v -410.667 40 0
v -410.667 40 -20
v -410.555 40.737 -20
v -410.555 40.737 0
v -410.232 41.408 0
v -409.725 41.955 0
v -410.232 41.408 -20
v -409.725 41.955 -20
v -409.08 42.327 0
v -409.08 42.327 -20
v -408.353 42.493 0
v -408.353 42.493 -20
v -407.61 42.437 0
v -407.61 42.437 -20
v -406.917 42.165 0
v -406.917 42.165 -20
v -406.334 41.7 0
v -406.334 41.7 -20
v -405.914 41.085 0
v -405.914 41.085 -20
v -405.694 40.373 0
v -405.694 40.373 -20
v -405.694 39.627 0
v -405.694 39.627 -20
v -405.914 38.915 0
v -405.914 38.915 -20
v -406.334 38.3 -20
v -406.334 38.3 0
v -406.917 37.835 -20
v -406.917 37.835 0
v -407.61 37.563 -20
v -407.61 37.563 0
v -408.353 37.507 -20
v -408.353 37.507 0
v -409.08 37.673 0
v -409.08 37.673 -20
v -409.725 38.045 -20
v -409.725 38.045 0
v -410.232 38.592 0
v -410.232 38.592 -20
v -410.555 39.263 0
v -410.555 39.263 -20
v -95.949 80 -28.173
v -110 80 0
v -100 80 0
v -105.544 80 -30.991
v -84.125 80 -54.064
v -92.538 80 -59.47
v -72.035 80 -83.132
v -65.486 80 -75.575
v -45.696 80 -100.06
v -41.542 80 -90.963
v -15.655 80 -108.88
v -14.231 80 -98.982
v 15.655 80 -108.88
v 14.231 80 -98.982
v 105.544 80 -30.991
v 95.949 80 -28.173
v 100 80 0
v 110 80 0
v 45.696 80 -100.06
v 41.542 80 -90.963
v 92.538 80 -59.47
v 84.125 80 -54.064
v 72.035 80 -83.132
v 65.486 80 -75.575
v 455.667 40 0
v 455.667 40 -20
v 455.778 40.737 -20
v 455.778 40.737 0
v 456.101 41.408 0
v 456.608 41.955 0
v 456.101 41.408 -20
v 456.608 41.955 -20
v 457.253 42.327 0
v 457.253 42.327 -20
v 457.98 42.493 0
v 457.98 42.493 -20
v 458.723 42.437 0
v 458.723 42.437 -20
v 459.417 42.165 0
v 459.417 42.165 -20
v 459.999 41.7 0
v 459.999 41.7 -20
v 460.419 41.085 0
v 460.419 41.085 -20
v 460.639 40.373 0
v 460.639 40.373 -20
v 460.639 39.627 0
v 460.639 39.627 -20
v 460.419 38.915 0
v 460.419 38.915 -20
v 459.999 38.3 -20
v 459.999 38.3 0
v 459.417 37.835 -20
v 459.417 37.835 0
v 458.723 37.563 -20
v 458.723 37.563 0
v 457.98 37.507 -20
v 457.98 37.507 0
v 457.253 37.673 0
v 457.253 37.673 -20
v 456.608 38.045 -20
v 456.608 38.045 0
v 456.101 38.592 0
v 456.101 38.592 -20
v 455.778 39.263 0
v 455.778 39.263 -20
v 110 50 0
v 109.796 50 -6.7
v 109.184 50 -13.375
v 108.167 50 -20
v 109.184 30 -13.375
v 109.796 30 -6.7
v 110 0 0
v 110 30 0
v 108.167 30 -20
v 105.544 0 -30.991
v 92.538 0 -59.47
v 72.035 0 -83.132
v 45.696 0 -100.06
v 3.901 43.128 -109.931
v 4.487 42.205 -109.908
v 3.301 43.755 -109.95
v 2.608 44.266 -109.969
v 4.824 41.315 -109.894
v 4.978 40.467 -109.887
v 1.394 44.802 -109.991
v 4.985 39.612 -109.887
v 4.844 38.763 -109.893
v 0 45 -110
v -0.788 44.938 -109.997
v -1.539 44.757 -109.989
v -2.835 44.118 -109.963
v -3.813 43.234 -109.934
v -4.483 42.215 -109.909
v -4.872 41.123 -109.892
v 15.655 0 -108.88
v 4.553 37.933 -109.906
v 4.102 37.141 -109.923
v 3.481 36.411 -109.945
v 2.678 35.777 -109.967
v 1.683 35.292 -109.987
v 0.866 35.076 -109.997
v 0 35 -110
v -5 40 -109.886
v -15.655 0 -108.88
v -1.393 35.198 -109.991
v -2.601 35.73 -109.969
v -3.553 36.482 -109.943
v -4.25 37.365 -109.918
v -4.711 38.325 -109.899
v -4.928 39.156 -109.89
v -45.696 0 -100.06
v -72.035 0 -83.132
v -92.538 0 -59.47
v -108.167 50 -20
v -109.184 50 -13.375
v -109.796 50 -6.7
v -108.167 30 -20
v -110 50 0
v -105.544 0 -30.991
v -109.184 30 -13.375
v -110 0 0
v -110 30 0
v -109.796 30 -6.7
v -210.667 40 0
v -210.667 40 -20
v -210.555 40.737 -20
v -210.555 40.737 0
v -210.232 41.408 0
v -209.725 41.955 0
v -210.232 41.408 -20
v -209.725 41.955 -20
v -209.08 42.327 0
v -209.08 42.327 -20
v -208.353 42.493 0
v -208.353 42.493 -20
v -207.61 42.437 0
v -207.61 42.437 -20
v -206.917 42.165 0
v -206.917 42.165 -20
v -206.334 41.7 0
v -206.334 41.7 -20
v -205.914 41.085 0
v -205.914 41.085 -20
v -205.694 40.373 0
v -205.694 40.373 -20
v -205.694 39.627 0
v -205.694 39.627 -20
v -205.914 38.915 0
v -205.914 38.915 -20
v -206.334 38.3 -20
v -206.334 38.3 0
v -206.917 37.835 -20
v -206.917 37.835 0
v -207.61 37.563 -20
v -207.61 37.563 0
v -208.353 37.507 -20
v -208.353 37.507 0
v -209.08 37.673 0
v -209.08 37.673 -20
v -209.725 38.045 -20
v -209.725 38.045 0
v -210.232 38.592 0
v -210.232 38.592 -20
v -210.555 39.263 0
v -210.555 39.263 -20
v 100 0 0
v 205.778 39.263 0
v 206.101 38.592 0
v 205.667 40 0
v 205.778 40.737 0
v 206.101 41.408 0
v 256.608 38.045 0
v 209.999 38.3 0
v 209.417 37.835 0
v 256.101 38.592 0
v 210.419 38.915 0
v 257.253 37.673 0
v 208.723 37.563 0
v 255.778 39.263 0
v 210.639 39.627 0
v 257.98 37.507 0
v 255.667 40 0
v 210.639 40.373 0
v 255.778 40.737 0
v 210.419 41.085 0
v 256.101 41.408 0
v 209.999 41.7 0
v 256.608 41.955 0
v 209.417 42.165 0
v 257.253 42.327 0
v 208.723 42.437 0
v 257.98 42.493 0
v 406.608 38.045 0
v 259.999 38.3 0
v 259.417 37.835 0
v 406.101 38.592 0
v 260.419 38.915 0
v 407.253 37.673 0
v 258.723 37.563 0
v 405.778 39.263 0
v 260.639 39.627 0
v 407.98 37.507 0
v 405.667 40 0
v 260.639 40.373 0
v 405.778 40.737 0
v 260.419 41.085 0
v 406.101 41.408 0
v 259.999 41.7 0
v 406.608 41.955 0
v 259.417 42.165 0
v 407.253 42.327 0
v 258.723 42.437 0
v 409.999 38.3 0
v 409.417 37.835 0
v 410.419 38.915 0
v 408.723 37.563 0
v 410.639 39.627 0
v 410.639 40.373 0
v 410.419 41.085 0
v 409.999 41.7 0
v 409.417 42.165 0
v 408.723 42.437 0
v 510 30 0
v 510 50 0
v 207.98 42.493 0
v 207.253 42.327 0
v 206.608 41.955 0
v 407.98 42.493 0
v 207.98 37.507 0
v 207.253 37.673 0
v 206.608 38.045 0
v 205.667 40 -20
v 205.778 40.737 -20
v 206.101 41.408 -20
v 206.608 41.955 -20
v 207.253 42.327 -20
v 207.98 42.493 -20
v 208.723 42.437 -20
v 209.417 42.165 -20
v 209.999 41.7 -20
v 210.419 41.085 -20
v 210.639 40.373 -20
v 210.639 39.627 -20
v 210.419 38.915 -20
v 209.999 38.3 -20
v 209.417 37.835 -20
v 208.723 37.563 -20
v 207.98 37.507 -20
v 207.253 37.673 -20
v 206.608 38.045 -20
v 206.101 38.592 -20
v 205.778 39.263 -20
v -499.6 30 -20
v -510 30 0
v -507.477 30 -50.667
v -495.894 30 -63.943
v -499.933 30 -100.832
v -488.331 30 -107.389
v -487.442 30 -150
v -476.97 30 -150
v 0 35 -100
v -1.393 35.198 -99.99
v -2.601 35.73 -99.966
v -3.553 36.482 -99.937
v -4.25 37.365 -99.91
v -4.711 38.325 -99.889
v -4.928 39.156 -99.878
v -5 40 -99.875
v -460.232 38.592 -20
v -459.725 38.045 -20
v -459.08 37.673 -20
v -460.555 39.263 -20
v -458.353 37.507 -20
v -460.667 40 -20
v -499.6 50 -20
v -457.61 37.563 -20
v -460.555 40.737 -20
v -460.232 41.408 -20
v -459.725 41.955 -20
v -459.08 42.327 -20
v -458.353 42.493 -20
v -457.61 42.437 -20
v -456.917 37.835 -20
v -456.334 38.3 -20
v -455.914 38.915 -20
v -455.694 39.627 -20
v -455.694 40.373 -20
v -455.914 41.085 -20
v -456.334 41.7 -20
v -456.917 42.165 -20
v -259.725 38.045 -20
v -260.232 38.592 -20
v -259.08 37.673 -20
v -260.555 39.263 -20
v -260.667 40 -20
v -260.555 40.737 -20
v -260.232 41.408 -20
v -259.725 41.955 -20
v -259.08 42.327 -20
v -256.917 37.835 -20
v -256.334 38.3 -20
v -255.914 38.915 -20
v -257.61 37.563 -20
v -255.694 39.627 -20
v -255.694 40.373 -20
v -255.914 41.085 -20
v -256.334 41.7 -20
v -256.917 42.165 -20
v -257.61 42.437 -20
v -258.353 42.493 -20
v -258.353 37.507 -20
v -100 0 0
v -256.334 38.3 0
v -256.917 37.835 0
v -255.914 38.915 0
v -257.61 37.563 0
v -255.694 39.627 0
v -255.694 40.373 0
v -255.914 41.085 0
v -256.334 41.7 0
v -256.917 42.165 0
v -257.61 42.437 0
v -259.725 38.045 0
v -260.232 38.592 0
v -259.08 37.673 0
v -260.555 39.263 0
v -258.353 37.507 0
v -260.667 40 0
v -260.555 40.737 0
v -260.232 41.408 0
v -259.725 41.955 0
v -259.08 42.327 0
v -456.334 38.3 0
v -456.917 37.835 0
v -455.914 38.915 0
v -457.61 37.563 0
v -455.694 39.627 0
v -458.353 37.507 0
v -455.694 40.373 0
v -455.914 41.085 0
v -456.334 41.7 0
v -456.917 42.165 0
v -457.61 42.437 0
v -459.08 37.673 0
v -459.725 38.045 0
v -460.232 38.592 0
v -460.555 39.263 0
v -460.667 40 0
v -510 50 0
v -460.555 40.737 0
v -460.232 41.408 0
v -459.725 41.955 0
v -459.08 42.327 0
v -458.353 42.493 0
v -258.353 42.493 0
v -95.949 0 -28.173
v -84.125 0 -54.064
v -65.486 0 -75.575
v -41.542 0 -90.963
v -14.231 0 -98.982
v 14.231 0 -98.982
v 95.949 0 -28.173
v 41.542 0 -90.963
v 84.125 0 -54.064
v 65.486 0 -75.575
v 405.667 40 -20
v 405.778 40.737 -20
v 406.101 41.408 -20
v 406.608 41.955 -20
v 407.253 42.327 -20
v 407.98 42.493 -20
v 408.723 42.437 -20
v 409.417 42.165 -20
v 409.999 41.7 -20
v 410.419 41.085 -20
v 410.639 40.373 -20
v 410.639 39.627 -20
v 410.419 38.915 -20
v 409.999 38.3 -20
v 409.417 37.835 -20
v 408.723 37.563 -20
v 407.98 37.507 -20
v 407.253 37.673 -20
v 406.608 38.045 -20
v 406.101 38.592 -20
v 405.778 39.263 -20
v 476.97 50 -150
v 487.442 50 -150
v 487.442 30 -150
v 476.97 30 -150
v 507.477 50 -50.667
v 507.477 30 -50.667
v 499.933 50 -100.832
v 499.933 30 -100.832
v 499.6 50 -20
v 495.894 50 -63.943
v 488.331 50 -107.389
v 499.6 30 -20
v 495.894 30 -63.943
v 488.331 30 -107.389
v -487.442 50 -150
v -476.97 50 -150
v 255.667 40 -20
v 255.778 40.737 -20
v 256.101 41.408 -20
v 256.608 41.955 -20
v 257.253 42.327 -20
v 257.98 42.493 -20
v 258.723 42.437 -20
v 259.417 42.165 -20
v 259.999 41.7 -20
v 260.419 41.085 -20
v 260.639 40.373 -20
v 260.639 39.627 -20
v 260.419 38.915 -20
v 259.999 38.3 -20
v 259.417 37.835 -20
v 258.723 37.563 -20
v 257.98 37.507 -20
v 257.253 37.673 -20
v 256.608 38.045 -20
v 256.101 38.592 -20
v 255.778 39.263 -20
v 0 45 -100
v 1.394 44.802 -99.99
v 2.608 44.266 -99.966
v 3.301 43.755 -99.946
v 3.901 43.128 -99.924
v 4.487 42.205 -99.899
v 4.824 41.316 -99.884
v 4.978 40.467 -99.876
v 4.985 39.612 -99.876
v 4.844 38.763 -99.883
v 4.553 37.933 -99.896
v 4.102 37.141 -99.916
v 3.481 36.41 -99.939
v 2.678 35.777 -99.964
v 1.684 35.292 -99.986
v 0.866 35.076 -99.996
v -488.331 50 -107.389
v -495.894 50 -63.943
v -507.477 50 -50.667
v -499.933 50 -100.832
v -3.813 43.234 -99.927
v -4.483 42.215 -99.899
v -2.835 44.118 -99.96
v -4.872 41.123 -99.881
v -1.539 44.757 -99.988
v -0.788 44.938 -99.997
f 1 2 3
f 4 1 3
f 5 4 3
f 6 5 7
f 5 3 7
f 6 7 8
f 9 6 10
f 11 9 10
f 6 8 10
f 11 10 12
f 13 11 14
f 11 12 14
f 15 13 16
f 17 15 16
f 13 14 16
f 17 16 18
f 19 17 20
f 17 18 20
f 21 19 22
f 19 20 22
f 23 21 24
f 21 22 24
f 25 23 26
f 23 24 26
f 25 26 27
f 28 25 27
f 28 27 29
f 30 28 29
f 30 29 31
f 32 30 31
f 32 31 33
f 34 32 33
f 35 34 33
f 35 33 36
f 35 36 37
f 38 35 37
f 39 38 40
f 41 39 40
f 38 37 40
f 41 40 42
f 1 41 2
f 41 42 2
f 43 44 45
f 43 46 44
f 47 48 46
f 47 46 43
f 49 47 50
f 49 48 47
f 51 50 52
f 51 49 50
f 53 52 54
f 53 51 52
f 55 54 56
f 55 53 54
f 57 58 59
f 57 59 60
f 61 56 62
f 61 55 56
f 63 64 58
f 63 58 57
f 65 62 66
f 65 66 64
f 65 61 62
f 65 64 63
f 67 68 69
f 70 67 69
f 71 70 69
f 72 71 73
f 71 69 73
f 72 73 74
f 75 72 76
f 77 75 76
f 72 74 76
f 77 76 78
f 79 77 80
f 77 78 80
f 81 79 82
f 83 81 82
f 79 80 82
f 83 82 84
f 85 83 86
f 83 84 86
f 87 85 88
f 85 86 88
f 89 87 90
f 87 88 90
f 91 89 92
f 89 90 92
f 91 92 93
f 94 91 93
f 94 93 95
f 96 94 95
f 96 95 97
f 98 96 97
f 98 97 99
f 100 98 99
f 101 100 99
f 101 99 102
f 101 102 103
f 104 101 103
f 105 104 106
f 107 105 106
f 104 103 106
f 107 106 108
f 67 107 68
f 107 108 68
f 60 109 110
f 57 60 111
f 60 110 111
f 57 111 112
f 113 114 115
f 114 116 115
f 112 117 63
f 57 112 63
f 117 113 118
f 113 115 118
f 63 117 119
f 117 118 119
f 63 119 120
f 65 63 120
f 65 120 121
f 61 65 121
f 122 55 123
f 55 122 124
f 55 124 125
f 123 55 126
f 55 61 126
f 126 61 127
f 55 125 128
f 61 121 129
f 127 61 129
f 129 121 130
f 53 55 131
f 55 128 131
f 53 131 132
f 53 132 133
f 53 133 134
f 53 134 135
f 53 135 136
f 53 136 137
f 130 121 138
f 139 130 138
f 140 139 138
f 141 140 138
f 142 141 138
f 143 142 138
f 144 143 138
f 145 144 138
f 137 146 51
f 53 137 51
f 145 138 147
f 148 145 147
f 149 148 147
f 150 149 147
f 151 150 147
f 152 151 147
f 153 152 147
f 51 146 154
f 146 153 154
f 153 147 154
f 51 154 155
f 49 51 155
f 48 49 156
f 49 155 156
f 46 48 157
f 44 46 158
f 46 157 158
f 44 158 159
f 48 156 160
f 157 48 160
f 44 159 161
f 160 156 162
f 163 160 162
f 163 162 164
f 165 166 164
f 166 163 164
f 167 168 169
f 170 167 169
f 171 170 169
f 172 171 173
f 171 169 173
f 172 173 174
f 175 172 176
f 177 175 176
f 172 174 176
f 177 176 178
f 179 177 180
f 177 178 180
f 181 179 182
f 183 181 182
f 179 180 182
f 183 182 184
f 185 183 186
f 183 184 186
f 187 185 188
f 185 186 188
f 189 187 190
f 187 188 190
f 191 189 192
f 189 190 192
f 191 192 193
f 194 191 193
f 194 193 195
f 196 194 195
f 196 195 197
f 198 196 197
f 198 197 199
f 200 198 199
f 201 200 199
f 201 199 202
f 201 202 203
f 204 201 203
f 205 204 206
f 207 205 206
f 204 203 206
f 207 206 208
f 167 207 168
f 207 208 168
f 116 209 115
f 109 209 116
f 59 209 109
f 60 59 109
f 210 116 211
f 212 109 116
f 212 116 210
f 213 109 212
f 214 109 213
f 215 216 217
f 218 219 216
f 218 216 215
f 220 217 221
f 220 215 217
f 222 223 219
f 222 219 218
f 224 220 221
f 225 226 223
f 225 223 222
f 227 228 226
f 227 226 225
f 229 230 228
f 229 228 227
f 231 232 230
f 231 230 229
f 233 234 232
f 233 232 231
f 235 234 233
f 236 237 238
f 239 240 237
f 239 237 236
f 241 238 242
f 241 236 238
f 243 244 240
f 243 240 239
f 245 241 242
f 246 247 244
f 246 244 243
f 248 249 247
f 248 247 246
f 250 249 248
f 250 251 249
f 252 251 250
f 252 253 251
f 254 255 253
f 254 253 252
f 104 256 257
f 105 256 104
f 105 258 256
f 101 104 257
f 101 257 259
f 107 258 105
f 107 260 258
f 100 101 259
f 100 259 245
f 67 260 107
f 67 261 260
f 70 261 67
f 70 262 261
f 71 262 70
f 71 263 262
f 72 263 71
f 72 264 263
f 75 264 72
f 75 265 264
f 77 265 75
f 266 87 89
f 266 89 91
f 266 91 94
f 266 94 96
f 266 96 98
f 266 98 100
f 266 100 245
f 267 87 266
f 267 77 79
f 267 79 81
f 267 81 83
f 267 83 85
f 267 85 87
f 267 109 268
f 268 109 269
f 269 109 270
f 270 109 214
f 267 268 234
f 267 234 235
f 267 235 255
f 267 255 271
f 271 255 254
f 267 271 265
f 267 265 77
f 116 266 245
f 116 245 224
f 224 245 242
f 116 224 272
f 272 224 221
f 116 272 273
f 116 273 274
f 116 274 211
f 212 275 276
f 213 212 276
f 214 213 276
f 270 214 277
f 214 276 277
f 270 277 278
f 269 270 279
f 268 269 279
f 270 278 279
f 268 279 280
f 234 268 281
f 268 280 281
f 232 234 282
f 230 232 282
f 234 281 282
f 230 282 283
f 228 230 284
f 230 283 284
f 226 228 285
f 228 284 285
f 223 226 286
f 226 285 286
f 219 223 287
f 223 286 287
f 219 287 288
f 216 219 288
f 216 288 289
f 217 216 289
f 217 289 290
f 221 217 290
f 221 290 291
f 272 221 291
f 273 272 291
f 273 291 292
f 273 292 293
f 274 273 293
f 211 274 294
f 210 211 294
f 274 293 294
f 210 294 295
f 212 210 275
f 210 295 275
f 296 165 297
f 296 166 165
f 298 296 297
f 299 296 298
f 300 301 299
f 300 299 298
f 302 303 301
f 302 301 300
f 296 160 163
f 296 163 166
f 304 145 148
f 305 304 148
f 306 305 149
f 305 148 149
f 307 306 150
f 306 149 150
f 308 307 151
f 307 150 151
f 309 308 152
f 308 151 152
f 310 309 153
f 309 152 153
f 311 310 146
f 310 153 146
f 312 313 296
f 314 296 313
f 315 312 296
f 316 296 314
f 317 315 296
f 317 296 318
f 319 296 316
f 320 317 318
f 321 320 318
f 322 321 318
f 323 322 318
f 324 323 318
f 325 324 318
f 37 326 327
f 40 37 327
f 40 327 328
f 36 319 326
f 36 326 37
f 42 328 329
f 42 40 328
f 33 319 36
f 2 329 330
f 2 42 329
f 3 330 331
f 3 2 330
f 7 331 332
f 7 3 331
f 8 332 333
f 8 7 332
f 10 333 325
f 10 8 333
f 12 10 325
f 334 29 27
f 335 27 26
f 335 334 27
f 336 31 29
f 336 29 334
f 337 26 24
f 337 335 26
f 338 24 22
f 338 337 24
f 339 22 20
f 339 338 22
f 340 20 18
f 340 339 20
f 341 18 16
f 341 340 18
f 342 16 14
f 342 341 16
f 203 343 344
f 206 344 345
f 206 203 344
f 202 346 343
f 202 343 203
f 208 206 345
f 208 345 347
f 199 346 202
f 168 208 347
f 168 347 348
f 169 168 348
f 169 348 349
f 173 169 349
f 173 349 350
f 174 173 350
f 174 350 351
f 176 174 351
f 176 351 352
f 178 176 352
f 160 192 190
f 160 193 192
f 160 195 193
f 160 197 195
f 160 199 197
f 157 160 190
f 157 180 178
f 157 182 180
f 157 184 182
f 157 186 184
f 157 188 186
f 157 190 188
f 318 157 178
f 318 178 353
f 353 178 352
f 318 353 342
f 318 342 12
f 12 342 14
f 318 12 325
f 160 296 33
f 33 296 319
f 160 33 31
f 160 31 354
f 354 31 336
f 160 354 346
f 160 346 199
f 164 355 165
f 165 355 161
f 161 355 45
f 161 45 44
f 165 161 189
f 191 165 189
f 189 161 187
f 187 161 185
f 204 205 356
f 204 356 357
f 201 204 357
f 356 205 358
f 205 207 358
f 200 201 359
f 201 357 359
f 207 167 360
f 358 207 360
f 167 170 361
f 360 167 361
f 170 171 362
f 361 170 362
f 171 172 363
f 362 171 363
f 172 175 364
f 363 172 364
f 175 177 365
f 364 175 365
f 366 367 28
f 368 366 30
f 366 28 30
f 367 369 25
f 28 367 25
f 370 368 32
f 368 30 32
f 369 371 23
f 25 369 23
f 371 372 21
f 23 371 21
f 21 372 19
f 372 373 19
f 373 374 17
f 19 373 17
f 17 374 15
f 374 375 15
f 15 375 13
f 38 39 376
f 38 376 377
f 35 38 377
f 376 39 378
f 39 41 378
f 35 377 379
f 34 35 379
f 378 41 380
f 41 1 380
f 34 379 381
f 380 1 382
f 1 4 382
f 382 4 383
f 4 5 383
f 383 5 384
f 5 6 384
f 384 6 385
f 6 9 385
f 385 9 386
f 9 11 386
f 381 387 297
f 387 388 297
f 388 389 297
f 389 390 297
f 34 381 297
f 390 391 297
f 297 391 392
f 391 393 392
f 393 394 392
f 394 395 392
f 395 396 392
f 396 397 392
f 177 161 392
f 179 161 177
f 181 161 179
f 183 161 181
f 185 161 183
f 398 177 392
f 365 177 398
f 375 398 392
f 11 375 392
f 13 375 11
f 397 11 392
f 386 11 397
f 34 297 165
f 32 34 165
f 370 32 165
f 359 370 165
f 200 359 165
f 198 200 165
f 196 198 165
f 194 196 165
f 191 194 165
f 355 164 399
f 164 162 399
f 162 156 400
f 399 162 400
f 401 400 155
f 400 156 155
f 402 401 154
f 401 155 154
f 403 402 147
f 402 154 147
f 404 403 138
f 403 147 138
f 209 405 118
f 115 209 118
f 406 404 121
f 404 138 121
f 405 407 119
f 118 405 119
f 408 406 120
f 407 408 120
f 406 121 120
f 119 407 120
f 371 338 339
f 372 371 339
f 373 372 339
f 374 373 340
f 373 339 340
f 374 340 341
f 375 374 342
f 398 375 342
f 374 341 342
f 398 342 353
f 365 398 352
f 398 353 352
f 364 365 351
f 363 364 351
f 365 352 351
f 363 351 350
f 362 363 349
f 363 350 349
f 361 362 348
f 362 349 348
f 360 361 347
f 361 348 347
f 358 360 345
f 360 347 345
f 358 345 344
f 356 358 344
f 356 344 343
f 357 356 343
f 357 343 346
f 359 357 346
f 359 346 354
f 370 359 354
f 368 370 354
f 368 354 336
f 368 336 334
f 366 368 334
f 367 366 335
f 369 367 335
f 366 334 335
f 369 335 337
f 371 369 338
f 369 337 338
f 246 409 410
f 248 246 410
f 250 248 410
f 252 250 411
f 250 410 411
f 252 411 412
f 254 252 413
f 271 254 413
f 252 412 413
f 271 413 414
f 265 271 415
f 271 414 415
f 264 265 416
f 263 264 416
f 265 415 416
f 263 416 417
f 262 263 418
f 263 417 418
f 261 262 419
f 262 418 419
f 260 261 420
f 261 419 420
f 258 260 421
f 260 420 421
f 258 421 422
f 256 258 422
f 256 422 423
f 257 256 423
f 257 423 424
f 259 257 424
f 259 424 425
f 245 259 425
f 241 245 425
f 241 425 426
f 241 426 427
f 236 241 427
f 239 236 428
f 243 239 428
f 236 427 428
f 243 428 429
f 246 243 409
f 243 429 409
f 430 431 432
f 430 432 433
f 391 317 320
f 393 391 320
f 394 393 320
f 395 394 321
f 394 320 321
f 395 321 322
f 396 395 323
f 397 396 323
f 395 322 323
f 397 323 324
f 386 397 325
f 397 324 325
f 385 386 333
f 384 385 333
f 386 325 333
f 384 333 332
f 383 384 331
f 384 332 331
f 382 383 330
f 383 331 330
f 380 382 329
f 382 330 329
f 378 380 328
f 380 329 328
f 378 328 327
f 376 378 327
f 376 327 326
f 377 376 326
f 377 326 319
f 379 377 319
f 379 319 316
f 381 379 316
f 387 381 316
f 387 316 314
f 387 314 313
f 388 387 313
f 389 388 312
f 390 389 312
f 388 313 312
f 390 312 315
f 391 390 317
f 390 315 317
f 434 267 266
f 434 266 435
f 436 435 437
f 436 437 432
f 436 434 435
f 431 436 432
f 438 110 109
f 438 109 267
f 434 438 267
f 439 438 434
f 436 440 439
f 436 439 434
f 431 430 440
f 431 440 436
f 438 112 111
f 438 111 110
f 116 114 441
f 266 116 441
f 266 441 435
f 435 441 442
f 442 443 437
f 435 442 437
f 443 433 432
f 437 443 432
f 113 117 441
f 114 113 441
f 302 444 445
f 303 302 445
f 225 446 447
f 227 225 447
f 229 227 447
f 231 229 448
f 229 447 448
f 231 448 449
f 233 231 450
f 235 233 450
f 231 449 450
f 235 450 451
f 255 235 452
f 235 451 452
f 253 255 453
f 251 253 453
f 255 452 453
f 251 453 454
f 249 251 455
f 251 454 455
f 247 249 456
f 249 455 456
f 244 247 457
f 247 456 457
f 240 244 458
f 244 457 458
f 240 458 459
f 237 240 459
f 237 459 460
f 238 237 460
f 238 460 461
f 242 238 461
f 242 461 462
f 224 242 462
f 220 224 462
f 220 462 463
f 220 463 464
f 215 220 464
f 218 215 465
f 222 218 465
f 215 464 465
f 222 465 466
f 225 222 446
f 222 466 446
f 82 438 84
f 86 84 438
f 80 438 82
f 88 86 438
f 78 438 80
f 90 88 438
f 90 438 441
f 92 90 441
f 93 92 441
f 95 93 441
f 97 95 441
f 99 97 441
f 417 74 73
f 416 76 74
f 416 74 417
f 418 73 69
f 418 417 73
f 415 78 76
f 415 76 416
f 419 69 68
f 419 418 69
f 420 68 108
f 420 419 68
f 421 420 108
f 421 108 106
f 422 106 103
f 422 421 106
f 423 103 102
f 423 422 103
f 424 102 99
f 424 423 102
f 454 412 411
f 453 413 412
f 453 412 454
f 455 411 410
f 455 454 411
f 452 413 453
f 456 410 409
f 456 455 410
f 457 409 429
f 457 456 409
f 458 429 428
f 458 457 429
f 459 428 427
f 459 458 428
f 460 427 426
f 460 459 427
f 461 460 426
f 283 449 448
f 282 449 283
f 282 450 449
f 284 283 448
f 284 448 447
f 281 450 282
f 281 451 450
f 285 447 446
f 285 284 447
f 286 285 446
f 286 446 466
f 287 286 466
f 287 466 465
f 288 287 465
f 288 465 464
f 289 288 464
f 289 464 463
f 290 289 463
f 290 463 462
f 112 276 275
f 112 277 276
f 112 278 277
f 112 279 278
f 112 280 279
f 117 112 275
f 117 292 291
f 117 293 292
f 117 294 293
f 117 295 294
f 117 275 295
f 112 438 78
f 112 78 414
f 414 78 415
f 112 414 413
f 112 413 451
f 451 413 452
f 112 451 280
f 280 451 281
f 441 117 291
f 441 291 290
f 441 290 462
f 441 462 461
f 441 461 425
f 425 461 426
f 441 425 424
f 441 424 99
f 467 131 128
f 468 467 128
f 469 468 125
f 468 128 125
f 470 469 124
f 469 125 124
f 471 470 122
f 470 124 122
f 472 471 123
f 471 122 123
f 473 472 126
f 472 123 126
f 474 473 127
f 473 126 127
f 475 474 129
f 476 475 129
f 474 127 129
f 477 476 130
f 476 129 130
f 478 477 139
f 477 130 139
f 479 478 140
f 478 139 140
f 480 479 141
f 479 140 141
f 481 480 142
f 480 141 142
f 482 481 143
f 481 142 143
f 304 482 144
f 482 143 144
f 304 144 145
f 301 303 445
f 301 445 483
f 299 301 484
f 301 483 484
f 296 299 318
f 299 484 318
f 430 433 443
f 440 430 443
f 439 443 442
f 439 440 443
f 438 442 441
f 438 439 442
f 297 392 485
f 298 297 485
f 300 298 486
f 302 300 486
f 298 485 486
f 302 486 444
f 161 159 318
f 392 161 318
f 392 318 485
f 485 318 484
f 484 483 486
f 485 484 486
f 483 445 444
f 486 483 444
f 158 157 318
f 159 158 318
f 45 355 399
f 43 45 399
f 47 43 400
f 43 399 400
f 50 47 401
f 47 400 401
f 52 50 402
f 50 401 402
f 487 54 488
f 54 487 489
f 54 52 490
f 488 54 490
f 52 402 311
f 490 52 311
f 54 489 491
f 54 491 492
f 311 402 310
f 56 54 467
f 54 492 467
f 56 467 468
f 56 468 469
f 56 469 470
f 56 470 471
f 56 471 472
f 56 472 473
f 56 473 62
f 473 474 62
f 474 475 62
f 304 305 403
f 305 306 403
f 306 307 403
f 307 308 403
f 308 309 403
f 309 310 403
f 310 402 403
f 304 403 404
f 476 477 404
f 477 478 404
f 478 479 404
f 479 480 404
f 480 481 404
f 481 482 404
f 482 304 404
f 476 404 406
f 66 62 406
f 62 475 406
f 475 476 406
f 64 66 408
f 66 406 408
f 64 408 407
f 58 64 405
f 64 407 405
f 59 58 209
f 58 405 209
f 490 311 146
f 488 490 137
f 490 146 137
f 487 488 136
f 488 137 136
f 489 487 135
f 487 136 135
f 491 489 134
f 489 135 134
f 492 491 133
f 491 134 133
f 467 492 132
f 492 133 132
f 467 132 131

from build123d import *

# Parameters (mm, degrees)
BOSS_EXTRUDE1_DEPTH = 80
SKETCH2_W           = 20
SKETCH2_H           = 10
BOSS_EXTRUDE2_DEPTH = 400
SKETCH3_W           = 20
SKETCH3_H           = 20
BOSS_EXTRUDE3_DEPTH = 400
BOSS_EXTRUDE4_DEPTH = 20
BOSS_EXTRUDE5_DEPTH = 20
SKETCH8_R           = 2.5
CUT_EXTRUDE1_DEPTH  = 20
CUT_EXTRUDE3_DEPTH  = 20


with BuildPart() as part:
    # Sketch1 → Boss-Extrude1 (new body)
    with BuildSketch(Plane(origin=(0, 0, 0), x_dir=(1, 0, 0), z_dir=(0, 1, 0))):
        with BuildLine():
            Line((-110, 0), (-100, 0))
            ThreePointArc((-100, 0), (0, 100), (100, 0))
            Line((100, 0), (110, 0))
            ThreePointArc((110, 0), (0, 110), (-110, 0))
        make_face()
    extrude(amount=BOSS_EXTRUDE1_DEPTH)

    # Sketch2 → Boss-Extrude2 (add)
    with BuildSketch(Plane(origin=(100, 80, 0), x_dir=(0, 0, 1), z_dir=(-1, 0, 0))):
        with Locations((-10, -35)):
            Rectangle(SKETCH2_W, SKETCH2_H)
        with Locations((-10, -45)):
            Rectangle(SKETCH2_W, SKETCH2_H)
    extrude(amount=-BOSS_EXTRUDE2_DEPTH)

    # Sketch3 → Boss-Extrude3 (add)
    with BuildSketch(Plane(origin=(-100, 80, 0), x_dir=(0, 0, -1), z_dir=(1, 0, 0))):
        with Locations((10, -40)):
            Rectangle(SKETCH3_W, SKETCH3_H)
    extrude(amount=-BOSS_EXTRUDE3_DEPTH)

    # Sketch5 → Boss-Extrude4 (add)
    with BuildSketch(Plane(origin=(0, 50, 0), x_dir=(1, 0, 0), z_dir=(0, 1, 0))):
        with BuildLine():
            Line((500, 0), (510, 0))
            ThreePointArc((510, 0), (504.329046943, 75.843341231), (487.442304278, 150))
            Line((487.442304278, 150), (476.969600708, 150))
            ThreePointArc((476.969600708, 150), (494.208862908, 75.878849641), (500, 0))
        make_face()
    extrude(amount=-BOSS_EXTRUDE4_DEPTH)

    # Sketch7 → Boss-Extrude5 (add)
    with BuildSketch(Plane(origin=(0, 50, 0), x_dir=(1, 0, 0), z_dir=(0, 1, 0))):
        with BuildLine():
            ThreePointArc((-510, 0), (-504.329046943, 75.843341231), (-487.442304278, 150))
            Line((-487.442304278, 150), (-476.969600708, 150))
            ThreePointArc((-476.969600708, 150), (-494.208862908, 75.878849641), (-500, 0))
            Line((-500, 0), (-510, 0))
        make_face()
    extrude(amount=-BOSS_EXTRUDE5_DEPTH)

    # Sketch8 → Cut-Extrude1 (cut)
    with BuildSketch(Plane(origin=(0, 0, -20), x_dir=(-1, 0, 0), z_dir=(0, 0, -1))):
        with Locations((-408.166538264, 40)):
            Circle(SKETCH8_R)
        with Locations((-258.166538264, 40)):
            Circle(SKETCH8_R)
        with Locations((258.166538264, 40)):
            Circle(SKETCH8_R)
        with Locations((408.166538264, 40)):
            Circle(SKETCH8_R)
        with Locations((-458.166538264, 40)):
            Circle(SKETCH8_R)
        with Locations((-208.166538264, 40)):
            Circle(SKETCH8_R)
        with Locations((208.166538264, 40)):
            Circle(SKETCH8_R)
        with Locations((458.166538264, 40)):
            Circle(SKETCH8_R)
    extrude(amount=-CUT_EXTRUDE1_DEPTH, mode=Mode.SUBTRACT)

    # Sketch9 → Cut-Extrude3 (cut)
    with BuildSketch(Plane(origin=(0, 80, -110), x_dir=(-1, 0, 0), z_dir=(0, 0, -1))):
        with BuildLine():
            ThreePointArc((0, -35), (-5, -40), (0, -45))
            Line((0, -45), (0, -35))
        make_face()
        with BuildLine():
            Line((0, -35), (0, -45))
            ThreePointArc((0, -45), (3.535533906, -43.535533906), (5, -40))
            ThreePointArc((5, -40), (3.535533906, -36.464466094), (0, -35))
        make_face()
    extrude(amount=-CUT_EXTRUDE3_DEPTH, mode=Mode.SUBTRACT)


solid = part.part
